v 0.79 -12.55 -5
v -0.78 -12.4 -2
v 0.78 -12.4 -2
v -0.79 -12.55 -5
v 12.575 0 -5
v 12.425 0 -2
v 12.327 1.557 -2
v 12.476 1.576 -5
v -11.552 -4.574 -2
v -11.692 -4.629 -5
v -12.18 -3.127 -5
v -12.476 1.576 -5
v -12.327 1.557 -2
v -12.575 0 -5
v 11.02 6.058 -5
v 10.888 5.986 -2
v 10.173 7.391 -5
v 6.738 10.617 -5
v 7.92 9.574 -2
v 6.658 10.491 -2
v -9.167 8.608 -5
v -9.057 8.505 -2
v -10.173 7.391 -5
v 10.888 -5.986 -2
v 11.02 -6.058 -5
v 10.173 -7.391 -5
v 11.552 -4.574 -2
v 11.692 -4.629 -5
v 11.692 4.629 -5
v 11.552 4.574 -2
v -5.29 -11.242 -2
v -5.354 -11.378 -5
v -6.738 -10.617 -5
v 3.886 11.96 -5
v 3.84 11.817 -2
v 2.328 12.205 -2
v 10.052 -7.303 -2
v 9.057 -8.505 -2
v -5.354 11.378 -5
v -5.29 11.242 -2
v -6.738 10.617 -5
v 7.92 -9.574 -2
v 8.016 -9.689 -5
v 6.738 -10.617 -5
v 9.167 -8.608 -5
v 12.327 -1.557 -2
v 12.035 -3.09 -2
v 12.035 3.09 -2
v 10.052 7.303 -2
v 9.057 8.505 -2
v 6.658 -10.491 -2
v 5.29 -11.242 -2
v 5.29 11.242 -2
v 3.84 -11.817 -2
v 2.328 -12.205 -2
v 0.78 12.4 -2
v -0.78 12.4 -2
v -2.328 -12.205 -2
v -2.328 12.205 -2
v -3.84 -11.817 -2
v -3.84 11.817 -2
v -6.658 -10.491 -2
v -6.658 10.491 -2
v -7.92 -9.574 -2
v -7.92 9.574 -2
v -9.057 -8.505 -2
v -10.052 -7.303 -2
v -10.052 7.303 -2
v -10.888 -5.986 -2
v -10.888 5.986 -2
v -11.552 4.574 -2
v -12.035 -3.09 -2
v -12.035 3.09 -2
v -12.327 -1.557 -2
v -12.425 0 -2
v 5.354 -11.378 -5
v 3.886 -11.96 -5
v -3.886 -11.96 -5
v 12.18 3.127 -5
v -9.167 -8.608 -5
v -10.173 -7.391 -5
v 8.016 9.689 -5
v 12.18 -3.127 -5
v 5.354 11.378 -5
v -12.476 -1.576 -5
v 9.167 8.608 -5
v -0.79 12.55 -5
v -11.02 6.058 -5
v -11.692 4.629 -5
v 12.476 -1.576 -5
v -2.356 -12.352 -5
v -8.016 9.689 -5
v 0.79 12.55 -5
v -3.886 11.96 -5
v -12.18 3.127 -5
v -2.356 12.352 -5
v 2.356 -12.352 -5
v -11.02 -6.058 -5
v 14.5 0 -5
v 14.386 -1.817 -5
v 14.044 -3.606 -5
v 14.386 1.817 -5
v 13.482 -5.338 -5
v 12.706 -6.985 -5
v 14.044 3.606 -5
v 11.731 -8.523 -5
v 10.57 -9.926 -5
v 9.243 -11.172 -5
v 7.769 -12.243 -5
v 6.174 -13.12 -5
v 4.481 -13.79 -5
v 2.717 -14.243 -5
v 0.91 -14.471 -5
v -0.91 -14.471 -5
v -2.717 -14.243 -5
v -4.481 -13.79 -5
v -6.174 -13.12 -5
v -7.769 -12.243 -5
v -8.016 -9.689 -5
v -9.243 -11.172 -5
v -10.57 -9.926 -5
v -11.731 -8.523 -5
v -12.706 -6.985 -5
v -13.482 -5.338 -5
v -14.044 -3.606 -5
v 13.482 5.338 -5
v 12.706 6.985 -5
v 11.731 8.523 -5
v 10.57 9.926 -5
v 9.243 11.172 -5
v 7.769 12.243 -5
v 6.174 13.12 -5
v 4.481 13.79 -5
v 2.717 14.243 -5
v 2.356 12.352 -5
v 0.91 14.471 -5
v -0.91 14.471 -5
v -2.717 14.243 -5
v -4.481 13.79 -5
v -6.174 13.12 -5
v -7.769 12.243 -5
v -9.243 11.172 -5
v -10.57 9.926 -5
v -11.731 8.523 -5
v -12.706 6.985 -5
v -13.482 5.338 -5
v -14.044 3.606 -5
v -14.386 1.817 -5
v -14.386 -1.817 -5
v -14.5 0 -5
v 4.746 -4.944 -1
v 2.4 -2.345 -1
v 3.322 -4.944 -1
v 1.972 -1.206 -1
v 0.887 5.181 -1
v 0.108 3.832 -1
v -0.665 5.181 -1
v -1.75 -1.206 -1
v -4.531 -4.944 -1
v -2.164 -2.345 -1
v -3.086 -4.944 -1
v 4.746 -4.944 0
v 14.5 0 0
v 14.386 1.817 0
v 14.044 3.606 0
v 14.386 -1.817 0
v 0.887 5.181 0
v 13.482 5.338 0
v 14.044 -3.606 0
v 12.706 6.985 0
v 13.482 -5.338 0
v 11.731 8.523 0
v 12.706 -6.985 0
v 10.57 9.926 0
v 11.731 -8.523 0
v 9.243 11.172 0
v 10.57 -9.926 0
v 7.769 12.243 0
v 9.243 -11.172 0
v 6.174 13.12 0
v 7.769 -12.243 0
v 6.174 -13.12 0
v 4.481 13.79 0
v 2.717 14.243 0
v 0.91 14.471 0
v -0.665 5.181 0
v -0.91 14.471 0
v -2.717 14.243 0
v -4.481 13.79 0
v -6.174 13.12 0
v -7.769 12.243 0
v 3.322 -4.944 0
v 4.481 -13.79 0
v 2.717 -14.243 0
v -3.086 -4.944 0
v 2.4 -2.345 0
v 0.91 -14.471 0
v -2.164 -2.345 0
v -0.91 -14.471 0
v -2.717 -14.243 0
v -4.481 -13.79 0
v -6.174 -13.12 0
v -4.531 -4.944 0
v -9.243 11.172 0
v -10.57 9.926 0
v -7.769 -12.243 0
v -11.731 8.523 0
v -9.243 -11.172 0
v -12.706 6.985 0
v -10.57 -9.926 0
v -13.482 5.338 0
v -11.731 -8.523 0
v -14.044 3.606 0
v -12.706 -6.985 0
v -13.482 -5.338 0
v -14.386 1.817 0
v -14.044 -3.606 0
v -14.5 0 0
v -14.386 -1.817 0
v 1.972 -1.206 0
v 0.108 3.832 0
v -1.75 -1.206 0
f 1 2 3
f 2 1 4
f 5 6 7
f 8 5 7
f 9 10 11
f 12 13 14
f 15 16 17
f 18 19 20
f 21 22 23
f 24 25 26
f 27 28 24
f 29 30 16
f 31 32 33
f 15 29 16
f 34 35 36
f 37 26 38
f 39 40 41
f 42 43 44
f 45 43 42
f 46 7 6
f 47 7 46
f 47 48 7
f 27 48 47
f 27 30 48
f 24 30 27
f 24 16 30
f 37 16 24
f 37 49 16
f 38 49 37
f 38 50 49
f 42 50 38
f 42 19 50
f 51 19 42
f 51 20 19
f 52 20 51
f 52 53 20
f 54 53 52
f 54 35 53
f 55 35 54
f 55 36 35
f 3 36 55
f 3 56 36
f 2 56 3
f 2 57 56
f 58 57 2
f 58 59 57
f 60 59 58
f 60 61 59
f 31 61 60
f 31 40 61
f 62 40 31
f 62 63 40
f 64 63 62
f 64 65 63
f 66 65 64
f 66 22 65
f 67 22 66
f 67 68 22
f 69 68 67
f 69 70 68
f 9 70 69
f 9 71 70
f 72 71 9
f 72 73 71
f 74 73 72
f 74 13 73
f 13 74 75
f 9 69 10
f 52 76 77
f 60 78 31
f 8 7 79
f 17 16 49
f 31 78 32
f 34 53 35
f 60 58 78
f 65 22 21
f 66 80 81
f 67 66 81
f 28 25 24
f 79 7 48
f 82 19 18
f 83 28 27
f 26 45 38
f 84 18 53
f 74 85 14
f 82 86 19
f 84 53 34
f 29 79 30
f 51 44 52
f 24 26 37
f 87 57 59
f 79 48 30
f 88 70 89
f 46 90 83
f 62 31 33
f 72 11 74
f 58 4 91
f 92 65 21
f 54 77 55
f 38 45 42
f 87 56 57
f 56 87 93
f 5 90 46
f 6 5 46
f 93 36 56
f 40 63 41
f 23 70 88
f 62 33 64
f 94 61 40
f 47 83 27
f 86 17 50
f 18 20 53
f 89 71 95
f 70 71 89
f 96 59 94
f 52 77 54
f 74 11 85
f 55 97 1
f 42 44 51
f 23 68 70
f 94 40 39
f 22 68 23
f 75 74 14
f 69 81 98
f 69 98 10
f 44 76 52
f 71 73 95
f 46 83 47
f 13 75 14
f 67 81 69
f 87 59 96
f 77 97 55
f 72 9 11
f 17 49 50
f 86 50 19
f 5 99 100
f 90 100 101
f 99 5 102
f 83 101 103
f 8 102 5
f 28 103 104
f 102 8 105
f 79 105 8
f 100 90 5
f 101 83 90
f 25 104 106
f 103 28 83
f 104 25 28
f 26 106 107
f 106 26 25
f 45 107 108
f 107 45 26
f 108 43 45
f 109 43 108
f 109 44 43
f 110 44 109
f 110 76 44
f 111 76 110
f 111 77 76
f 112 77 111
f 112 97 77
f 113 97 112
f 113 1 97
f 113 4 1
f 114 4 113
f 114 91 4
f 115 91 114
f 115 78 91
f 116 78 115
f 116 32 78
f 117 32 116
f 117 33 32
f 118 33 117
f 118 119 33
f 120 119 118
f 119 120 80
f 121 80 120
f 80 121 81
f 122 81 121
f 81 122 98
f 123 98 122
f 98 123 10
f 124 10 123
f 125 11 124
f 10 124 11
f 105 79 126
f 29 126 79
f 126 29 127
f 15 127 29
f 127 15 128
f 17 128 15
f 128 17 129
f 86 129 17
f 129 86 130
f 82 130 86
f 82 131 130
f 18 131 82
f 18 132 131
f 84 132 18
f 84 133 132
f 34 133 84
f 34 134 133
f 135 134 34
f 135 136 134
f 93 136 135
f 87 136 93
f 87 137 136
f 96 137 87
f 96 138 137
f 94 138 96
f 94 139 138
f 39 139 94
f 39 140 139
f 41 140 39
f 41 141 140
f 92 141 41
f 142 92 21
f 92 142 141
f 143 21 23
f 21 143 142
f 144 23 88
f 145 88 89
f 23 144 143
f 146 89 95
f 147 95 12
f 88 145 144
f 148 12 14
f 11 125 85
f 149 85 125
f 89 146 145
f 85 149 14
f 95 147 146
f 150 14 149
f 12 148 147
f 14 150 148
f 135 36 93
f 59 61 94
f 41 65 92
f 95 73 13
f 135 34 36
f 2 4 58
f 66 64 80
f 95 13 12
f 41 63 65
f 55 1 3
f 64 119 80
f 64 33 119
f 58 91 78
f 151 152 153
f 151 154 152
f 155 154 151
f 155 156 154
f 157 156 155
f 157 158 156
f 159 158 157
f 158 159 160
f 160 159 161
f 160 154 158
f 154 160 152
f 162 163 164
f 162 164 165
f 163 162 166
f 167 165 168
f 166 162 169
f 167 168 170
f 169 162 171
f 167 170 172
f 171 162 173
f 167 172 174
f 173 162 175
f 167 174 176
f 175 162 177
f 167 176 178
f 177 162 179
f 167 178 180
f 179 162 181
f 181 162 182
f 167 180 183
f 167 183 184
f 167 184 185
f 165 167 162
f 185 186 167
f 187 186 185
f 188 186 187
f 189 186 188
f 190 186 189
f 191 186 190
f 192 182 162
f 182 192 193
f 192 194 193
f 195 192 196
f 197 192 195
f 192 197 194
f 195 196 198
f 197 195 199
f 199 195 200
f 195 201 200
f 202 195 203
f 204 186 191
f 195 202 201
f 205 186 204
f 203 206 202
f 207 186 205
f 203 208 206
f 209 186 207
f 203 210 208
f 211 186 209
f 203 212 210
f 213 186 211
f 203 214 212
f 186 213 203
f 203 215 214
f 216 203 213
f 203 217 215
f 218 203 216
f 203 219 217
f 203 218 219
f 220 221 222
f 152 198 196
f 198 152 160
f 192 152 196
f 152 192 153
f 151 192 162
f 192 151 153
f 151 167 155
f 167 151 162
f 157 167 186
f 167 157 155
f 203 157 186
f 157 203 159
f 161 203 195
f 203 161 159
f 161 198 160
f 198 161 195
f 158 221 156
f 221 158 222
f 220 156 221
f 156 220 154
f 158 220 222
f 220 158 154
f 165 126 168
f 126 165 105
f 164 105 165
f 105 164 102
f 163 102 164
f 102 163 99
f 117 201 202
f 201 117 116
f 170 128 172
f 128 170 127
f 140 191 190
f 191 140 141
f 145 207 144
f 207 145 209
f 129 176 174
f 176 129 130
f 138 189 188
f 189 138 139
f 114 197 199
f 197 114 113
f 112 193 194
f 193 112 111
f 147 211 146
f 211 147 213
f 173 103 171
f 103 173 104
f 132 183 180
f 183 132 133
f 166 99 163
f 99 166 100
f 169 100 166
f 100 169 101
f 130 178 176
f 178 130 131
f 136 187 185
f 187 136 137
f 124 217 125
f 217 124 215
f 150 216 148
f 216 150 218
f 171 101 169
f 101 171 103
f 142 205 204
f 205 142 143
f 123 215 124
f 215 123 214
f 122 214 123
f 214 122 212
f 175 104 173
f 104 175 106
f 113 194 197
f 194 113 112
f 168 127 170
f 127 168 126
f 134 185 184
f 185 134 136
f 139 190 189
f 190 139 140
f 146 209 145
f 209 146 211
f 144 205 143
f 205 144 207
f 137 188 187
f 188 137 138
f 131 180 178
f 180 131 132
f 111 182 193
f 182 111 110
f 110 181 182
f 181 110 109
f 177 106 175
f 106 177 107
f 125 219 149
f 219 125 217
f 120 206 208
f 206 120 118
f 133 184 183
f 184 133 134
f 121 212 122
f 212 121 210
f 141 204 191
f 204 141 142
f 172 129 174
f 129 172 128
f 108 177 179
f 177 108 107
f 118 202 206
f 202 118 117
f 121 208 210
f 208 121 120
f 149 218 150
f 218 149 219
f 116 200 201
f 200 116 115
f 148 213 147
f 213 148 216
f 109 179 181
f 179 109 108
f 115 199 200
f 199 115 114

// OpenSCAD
$fn = 50;


difference() {
	union() {
		translate(v = [0, 0, -5.0000000000]) {
			cylinder(h = 5, r = 14.5000000000);
		}
	}
	union() {
		#translate(v = [0, 0, -5.0000000000]) {
			cylinder(h = 3, r1 = 12.5750000000, r2 = 12.4250000000);
		}
		translate(v = [0, 0, -1]) {
			linear_extrude(height = 1) {
				text(font = "Impact", halign = "center", size = 10, text = "A", valign = "center");
			}
		}
	}
}
